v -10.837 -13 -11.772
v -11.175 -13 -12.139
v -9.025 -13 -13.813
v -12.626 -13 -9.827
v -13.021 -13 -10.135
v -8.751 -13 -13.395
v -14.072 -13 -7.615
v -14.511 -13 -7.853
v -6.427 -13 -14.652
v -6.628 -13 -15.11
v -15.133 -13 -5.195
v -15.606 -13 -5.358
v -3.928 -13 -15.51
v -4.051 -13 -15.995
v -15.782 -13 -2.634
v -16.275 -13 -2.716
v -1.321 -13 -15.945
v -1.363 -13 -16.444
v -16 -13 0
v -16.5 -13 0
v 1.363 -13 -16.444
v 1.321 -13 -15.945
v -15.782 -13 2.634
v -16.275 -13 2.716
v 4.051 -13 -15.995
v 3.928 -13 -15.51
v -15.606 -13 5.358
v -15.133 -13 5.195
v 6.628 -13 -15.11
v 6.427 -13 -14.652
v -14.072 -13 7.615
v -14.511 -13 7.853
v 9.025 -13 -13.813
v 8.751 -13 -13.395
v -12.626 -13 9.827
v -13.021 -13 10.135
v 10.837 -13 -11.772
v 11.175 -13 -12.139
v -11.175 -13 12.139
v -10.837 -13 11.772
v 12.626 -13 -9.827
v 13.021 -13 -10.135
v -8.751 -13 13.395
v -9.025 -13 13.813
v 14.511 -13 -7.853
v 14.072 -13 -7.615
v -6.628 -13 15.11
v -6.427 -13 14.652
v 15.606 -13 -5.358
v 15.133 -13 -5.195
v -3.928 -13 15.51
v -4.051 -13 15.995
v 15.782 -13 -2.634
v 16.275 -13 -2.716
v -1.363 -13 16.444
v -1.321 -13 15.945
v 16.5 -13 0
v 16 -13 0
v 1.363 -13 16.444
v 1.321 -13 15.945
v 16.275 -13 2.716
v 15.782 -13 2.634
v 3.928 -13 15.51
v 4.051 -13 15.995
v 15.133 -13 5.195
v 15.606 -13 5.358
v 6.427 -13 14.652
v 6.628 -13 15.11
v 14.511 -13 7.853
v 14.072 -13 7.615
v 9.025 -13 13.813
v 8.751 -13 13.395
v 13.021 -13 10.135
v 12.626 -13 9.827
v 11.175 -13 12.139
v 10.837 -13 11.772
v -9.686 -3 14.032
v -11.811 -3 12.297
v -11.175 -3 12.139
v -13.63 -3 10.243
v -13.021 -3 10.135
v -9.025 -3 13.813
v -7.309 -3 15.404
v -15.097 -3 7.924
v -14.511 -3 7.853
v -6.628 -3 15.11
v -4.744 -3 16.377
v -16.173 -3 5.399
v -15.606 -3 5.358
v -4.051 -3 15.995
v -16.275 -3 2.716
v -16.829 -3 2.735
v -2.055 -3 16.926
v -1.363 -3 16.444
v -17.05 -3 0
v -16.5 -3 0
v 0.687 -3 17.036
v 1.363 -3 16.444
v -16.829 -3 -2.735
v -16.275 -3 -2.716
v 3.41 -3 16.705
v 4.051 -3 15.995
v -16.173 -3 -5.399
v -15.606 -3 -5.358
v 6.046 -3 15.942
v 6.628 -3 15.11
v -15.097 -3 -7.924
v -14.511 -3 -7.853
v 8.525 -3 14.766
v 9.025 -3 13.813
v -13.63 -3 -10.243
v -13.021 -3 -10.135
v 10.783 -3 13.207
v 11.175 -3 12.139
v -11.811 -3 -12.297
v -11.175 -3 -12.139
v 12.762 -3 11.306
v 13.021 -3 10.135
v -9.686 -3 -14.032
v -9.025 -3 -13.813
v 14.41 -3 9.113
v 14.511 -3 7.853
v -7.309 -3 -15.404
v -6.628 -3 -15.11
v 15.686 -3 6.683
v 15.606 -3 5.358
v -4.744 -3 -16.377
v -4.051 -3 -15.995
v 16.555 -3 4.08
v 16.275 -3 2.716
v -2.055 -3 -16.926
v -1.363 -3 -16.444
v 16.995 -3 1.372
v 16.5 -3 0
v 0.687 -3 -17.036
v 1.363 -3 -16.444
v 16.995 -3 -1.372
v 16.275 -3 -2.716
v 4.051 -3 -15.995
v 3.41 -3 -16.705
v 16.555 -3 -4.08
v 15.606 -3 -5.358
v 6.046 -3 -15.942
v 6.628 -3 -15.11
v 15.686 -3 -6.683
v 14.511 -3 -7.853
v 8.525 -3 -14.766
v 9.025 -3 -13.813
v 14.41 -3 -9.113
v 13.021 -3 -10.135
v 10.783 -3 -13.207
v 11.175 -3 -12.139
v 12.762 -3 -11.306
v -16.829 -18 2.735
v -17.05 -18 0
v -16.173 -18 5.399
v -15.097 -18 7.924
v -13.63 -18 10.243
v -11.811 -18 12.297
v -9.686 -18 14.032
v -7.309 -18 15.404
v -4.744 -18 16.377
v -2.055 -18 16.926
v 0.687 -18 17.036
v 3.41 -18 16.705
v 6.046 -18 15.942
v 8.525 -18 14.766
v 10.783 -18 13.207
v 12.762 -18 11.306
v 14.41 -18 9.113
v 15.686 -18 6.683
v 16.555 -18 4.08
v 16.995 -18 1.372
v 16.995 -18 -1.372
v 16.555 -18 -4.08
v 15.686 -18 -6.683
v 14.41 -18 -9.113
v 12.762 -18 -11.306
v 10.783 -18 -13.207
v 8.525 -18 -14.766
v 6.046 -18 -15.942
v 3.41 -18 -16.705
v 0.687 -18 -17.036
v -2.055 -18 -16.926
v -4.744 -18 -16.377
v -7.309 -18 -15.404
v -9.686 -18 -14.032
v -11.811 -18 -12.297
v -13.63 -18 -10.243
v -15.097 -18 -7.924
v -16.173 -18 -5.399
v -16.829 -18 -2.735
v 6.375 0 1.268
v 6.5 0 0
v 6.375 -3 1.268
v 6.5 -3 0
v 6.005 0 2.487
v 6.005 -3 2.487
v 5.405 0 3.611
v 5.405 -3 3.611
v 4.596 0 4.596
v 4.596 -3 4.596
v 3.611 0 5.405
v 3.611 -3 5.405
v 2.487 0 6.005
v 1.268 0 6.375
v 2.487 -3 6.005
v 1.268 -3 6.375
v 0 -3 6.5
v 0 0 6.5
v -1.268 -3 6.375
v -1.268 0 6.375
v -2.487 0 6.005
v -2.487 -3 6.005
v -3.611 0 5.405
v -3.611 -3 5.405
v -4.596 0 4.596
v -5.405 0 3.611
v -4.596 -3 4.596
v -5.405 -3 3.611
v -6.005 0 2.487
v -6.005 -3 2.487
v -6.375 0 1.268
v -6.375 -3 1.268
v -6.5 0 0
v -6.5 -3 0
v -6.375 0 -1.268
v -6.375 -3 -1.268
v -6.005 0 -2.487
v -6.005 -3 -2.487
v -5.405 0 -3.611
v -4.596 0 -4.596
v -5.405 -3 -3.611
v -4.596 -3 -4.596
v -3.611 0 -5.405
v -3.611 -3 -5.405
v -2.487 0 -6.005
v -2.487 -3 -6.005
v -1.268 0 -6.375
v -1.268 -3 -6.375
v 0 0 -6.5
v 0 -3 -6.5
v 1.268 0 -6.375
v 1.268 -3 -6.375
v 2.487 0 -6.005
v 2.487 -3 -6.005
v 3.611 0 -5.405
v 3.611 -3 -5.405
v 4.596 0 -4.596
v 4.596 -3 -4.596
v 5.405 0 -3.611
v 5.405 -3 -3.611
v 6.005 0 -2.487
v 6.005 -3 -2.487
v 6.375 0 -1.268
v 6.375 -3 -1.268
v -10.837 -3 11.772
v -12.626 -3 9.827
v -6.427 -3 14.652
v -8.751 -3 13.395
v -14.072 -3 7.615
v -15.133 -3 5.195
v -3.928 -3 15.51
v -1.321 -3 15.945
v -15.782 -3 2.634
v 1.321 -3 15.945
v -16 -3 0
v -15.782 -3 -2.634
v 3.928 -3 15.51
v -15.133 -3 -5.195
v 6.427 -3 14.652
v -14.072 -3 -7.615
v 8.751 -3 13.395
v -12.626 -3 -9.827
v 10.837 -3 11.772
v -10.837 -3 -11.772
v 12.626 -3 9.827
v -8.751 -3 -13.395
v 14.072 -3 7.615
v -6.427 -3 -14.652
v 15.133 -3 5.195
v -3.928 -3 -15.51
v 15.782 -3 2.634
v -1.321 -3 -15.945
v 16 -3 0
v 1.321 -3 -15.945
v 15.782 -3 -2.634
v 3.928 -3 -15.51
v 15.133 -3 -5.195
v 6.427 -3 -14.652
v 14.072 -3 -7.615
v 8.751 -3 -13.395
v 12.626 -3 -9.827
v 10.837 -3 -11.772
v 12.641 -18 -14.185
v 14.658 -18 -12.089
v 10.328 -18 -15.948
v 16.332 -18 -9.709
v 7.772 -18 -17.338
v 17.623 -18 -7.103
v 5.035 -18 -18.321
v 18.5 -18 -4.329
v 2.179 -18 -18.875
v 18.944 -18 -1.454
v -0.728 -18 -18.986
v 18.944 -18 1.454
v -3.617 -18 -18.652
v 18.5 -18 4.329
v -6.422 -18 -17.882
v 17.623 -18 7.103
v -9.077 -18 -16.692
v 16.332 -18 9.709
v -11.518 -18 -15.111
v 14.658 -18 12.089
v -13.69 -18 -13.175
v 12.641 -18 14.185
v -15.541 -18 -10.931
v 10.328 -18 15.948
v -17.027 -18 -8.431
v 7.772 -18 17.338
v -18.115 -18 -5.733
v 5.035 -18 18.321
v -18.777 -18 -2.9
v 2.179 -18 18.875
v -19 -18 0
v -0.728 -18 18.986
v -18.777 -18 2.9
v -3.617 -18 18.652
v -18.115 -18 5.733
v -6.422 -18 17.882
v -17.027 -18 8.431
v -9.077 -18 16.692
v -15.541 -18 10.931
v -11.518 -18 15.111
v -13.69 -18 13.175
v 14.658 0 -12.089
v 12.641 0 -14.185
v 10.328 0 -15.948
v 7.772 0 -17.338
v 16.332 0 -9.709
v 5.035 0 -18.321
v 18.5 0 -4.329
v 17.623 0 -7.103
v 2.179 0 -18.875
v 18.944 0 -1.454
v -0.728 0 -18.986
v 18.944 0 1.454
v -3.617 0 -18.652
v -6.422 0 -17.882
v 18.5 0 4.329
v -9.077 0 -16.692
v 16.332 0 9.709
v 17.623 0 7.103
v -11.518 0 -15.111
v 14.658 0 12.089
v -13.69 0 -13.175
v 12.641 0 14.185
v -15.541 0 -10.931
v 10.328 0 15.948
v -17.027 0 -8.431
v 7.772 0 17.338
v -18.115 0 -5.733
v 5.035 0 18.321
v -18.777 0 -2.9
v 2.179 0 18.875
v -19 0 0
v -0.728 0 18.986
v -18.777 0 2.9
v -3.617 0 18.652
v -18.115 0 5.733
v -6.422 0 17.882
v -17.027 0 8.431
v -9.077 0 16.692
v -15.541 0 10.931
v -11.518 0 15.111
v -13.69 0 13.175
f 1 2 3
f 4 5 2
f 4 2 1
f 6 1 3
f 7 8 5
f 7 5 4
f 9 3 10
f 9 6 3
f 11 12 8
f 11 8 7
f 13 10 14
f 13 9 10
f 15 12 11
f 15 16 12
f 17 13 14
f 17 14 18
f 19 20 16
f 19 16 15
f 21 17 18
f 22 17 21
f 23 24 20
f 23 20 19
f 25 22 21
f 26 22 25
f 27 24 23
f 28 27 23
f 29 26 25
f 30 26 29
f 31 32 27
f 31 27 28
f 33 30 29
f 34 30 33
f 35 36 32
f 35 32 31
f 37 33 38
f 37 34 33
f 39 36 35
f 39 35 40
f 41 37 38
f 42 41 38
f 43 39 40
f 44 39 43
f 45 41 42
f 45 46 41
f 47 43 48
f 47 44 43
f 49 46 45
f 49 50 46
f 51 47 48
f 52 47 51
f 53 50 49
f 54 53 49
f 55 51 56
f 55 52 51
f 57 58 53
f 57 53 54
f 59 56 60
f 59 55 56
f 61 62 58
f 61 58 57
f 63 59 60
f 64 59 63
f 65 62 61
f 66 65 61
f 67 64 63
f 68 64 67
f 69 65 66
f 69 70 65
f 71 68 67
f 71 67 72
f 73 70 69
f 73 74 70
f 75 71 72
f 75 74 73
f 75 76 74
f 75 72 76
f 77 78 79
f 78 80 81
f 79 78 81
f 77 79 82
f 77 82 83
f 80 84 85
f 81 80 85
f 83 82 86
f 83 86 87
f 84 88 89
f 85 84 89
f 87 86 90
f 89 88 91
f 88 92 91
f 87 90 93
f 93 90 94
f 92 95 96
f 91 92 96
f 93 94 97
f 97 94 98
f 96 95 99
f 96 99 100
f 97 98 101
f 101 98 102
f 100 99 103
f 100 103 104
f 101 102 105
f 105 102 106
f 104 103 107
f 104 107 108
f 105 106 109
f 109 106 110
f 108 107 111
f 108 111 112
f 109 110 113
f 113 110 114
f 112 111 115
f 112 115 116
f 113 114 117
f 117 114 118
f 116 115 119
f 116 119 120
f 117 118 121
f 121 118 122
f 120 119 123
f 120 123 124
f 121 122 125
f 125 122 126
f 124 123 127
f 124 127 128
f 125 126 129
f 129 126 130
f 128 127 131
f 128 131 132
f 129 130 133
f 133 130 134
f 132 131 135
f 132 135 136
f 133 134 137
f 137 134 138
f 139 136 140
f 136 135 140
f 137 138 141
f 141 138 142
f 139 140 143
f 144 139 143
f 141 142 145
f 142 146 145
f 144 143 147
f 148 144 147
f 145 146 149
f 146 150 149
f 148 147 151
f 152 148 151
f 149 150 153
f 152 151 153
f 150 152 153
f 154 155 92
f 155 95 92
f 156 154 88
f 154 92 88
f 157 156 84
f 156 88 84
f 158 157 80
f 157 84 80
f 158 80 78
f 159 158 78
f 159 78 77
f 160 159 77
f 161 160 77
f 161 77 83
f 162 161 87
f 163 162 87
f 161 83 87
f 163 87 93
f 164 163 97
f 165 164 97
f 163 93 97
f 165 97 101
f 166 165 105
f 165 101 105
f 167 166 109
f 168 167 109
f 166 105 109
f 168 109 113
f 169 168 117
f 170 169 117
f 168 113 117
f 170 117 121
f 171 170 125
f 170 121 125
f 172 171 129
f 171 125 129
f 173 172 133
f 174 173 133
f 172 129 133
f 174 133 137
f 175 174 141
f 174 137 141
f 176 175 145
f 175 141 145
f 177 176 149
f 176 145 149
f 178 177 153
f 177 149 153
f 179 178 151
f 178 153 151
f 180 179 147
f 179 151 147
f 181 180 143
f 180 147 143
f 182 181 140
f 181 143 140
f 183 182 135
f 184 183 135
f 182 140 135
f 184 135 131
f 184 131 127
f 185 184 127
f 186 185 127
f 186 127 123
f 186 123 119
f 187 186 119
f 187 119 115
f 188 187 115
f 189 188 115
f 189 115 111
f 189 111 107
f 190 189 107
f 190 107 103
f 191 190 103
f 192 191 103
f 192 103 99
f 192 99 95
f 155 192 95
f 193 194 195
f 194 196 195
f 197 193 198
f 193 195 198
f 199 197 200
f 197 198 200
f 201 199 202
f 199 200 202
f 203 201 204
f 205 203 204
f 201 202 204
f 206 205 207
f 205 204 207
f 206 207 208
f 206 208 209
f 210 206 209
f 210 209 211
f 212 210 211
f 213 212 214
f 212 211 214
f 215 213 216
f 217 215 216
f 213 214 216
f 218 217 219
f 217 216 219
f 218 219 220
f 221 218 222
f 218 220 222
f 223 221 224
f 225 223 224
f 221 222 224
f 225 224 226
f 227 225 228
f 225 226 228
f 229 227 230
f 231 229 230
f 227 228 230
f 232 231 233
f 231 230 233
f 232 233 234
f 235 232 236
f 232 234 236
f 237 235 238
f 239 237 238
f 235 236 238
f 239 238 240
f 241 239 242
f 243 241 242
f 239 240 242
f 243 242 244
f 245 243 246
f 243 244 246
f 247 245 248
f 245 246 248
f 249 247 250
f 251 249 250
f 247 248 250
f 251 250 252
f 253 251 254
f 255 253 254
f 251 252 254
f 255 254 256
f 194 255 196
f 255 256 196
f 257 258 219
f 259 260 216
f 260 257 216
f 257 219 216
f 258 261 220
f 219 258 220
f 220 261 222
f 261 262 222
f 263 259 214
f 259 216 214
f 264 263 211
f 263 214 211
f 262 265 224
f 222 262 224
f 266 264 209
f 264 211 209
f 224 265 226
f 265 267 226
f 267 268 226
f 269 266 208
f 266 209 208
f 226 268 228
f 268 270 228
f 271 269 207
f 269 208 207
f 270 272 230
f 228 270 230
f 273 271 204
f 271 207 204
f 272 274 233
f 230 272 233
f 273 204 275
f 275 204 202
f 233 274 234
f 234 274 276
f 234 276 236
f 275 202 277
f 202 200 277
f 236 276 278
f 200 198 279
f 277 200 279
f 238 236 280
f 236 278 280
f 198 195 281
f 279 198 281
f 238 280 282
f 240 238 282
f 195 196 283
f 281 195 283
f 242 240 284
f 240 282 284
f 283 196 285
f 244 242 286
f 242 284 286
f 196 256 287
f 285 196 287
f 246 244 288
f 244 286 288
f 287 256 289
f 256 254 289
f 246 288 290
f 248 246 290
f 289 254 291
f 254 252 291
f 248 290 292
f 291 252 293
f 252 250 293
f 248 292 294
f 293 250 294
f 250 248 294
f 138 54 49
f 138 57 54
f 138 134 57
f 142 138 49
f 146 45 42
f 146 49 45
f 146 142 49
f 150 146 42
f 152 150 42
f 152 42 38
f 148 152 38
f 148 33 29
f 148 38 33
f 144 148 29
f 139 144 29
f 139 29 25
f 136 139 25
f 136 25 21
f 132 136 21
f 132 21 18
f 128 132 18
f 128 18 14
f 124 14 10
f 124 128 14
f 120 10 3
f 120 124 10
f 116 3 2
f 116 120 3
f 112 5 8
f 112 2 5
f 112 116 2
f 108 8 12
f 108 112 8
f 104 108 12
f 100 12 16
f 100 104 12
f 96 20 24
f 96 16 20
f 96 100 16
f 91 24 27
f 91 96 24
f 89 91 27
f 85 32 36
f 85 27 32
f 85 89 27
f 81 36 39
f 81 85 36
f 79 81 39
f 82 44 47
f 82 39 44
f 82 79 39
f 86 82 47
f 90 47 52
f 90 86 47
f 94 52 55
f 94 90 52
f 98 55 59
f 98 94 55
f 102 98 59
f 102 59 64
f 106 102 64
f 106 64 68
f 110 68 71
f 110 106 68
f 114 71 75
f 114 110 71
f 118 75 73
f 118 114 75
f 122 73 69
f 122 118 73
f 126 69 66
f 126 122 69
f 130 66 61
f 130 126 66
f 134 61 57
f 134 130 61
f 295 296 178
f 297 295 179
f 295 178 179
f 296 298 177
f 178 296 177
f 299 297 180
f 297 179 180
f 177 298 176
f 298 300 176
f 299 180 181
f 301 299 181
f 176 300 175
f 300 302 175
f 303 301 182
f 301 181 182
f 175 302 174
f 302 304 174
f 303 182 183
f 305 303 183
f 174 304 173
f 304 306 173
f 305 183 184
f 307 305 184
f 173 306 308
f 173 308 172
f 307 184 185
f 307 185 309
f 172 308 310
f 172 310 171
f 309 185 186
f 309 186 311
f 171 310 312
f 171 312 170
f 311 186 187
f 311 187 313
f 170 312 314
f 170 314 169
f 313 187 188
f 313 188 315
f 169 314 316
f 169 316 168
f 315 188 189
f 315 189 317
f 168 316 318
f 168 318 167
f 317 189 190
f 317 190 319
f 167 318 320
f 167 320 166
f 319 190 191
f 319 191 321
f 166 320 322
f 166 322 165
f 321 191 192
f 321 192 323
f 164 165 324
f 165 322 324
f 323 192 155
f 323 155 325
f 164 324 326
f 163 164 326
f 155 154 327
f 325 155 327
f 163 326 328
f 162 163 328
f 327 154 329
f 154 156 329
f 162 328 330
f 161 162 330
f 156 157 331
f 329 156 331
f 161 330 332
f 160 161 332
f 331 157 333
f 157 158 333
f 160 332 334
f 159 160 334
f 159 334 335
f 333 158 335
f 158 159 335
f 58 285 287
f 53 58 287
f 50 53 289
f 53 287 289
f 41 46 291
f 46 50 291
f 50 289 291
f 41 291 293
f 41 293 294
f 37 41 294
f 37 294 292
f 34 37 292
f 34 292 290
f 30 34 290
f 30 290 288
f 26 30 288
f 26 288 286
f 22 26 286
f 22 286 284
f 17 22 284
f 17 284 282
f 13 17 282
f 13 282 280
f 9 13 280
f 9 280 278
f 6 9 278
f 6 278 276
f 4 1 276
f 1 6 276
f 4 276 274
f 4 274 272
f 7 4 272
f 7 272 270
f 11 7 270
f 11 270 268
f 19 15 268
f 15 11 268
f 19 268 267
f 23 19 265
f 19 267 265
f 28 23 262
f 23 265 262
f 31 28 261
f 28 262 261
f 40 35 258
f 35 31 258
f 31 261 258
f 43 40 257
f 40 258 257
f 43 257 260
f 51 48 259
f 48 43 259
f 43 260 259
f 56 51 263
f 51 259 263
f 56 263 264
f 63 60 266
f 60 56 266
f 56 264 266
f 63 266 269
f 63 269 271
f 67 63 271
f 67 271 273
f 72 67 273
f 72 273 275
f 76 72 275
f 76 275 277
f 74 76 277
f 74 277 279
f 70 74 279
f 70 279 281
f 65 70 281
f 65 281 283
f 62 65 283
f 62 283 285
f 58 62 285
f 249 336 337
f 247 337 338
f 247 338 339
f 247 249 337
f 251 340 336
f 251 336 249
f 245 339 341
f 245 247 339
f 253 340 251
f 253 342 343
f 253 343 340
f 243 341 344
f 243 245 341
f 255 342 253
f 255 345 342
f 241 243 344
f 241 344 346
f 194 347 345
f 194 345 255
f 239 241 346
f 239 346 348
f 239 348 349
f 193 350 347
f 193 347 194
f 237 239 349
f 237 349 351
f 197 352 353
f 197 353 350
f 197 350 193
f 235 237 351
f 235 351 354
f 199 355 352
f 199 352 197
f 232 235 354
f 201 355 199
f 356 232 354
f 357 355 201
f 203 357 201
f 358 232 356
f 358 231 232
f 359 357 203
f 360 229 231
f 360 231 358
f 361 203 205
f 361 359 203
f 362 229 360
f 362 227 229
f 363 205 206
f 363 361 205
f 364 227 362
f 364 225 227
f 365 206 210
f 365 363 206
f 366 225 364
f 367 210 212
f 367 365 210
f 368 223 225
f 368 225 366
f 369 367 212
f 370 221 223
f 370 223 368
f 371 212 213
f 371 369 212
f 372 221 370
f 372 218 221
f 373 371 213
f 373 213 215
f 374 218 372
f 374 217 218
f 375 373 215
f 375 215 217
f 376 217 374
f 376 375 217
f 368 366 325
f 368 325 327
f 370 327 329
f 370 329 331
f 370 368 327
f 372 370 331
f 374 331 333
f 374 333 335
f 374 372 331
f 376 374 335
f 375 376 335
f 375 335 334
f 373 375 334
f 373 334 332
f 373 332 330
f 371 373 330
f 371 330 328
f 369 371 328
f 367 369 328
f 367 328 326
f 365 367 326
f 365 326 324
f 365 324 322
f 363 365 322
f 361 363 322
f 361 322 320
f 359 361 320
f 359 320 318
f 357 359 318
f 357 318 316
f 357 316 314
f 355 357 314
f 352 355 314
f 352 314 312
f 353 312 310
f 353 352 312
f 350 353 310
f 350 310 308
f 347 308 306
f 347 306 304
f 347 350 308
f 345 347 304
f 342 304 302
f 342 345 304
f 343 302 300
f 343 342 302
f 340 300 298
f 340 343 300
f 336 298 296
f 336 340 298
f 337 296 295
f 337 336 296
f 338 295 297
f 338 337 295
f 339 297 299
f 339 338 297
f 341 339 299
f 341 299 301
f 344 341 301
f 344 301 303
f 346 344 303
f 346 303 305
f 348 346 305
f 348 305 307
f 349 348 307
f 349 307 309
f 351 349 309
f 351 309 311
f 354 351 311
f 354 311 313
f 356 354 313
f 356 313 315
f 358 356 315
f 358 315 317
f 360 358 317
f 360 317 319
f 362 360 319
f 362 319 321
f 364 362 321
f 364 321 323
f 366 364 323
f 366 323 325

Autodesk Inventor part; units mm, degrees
ref_plane "YZ Plane" through (0, 0, 0) normal (1, 0, 0) x (0, 1, 0)
ref_plane "XZ Plane" through (0, 0, 0) normal (0, 1, 0) x (-1, 0, 0)
ref_plane "XY Plane" through (0, 0, 0) normal (0, 0, 1) x (1, 0, 0)
sketch "Boceto4" plane through (0, 0, 0) normal (0, 1, 0) x (-1, 0, 0)
  circle A0 centre (0, 0) radius 17.05
  circle A1 centre (0, 0) radius 19
  dimension "d10" = 34.1
  dimension "d11" = 38
extrude "Extrusión4" add sketch "Boceto4" against normal blind 18
sketch "Boceto5" plane through (0, 0, 0) normal (0, 1, 0) x (1, 0, 0)
  circle A0 centre (0, 0) radius 17.05
extrude "Extrusión5" add sketch "Boceto5" against normal blind 3
sketch "Boceto6" plane through (0, -3, 0) normal (0, -1, 0) x (1, 0, 0)
  circle A0 centre (0, 0) radius 6.5
  dimension "d16" = 13
extrude "Extrusión6" cut sketch "Boceto6" against normal blind 3
sketch "Boceto7" plane through (0, -3, 0) normal (0, -1, 0) x (1, 0, 0)
  circle A0 centre (0, 0) radius 16
  circle A1 centre (0, 0) radius 6.5 projected
  circle A2 centre (0, 0) radius 16.5
  dimension "d19" = 32
  dimension "d20" = 33
extrude "Extrusión7" add sketch "Boceto7" along normal blind 10 contours A2
properties part number "tapa seccion alimentacion"
